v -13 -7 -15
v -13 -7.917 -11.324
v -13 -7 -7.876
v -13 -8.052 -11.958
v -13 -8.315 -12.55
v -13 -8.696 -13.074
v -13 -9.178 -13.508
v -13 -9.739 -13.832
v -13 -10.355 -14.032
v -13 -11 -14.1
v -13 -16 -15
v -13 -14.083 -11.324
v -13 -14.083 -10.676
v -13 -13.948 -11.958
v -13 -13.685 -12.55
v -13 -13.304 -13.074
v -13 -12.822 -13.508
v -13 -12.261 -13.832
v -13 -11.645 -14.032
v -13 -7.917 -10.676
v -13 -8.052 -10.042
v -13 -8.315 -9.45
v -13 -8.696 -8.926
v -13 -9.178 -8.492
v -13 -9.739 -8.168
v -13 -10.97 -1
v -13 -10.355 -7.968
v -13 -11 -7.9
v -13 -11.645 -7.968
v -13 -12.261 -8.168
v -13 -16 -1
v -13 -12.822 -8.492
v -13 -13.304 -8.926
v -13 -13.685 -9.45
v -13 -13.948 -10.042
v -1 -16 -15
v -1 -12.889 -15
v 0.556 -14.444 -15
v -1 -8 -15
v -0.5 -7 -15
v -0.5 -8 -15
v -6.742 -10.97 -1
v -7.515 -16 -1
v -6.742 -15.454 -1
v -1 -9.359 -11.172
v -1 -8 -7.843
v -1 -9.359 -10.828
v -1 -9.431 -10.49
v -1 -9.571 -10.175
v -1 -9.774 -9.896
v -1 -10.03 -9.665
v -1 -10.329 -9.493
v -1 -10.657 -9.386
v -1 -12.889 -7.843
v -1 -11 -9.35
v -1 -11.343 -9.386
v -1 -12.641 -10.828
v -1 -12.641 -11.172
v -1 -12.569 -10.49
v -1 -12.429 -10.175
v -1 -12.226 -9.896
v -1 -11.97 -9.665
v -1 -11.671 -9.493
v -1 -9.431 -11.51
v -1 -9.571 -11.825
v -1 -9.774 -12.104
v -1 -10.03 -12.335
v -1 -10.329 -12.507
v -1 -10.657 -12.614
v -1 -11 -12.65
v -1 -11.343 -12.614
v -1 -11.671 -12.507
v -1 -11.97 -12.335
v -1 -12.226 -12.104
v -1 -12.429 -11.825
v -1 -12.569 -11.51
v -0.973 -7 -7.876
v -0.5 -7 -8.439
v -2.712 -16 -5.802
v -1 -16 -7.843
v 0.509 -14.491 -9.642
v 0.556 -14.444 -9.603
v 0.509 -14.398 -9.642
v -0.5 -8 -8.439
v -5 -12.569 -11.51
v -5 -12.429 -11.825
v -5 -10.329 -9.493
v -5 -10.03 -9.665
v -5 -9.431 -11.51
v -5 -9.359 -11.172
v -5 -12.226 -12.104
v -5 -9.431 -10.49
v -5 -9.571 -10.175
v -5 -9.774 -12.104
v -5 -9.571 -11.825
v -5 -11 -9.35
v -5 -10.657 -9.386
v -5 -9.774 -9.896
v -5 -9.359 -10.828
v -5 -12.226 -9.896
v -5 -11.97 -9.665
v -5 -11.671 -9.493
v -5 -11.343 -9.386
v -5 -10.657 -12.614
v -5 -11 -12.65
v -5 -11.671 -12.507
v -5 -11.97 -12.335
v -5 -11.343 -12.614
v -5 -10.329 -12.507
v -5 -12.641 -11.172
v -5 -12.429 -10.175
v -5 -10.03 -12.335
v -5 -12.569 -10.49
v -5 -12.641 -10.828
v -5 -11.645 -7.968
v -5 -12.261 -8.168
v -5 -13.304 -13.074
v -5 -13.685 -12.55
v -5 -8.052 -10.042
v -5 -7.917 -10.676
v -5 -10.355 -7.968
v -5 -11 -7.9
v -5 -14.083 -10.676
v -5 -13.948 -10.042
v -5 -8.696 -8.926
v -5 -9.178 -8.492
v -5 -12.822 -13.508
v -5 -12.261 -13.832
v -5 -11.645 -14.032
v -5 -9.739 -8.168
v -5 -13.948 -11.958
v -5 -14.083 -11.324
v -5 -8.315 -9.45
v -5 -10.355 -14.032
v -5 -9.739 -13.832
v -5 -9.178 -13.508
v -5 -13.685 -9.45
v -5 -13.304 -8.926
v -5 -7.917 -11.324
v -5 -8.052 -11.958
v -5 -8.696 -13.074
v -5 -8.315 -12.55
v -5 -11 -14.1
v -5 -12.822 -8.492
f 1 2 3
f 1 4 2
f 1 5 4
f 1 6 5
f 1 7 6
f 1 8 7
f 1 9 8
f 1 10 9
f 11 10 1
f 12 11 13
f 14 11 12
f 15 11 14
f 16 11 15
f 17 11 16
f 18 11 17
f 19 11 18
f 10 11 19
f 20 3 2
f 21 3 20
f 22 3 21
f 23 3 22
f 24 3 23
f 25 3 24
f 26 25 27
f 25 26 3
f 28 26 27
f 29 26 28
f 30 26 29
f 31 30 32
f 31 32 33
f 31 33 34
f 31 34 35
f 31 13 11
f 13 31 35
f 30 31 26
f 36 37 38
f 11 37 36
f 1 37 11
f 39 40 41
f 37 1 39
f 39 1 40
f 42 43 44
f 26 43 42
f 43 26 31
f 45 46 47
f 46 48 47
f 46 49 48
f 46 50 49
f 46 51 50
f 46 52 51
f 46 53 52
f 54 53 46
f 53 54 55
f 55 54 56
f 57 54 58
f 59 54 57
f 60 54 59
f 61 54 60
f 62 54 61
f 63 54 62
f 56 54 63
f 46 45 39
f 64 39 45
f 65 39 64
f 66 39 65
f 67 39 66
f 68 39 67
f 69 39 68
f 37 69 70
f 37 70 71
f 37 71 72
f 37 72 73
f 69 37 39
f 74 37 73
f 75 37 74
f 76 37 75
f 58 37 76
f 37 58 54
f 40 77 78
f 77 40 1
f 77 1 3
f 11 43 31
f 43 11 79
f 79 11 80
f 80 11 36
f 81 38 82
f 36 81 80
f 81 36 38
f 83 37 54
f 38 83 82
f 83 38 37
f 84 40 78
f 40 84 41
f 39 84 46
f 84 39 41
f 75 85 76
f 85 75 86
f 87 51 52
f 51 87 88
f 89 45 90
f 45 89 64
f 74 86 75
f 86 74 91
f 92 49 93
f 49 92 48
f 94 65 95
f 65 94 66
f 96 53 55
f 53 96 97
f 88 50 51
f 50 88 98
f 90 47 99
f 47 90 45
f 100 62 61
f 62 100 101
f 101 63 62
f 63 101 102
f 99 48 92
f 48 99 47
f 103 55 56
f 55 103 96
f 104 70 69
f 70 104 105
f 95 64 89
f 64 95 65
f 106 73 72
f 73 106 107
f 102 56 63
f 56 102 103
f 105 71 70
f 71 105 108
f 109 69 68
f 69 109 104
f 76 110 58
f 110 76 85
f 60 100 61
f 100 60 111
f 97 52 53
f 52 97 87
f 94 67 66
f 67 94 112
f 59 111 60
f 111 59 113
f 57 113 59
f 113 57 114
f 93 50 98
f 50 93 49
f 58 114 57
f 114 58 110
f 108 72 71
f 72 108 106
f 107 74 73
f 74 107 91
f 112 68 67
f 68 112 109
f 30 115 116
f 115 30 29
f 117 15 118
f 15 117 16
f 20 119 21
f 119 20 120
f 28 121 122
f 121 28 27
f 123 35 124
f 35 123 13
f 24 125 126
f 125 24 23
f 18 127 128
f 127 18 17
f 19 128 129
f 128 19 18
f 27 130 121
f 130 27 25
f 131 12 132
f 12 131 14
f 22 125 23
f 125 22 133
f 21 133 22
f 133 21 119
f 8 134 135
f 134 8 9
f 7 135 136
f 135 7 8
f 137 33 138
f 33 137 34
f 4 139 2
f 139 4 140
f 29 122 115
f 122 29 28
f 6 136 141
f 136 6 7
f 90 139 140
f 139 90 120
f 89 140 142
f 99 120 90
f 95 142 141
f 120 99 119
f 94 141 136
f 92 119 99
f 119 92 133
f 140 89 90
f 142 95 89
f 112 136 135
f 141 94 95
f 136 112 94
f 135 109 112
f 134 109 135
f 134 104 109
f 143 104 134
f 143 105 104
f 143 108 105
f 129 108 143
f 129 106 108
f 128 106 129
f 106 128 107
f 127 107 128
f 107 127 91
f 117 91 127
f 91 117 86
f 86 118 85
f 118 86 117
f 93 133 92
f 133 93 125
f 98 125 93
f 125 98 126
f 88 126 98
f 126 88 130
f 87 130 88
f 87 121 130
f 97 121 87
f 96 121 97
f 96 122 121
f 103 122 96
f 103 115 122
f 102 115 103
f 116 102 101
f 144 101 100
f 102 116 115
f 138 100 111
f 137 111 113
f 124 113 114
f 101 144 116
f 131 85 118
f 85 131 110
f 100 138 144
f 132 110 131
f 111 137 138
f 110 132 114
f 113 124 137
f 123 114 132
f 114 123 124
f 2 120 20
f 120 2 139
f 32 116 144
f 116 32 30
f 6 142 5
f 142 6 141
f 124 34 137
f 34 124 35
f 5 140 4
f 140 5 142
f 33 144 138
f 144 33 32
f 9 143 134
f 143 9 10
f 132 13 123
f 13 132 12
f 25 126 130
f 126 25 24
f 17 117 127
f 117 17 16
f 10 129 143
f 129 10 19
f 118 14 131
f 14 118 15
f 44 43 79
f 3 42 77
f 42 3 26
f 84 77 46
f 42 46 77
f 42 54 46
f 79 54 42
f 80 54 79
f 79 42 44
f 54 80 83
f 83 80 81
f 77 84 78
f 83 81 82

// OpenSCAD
// PRUSA iteration4
// Endstop block
// GNU GPL v3
// Josef Průša <iam@josefprusa.cz> and contributors
// http://www.reprap.org/wiki/Prusa_Mendel
// http://prusamendel.org

module endstop_block()
{
    difference()
    {
        union()
        {
            // body
            translate([1,-16,1]) cube([12,9,14]);
            translate([1,-16,1]) rotate([0,0,45]) cube([3,2.2,14]);
            translate([0.5,-8,1]) cube([3,1,14]);
        }

        // screw
        translate([-4,-11,11]) rotate([0,90,0]) cylinder(r=1.65, h=10, $fn=30);
        translate([5,-11,11]) rotate([0,90,0]) cylinder(r=3.1, h=10, $fn=30);

        // edges
        translate([-13,-22,-0]) rotate([45,45,0]) cube([15,15,15]);
        translate([-1,-0,-10]) rotate([60,0,0]) cube([15,15,15]);
        translate([-12,-20,0]) rotate([0,50,0]) cube([15,15,15]);
    }
}


rotate([0,180,0]) endstop_block();
